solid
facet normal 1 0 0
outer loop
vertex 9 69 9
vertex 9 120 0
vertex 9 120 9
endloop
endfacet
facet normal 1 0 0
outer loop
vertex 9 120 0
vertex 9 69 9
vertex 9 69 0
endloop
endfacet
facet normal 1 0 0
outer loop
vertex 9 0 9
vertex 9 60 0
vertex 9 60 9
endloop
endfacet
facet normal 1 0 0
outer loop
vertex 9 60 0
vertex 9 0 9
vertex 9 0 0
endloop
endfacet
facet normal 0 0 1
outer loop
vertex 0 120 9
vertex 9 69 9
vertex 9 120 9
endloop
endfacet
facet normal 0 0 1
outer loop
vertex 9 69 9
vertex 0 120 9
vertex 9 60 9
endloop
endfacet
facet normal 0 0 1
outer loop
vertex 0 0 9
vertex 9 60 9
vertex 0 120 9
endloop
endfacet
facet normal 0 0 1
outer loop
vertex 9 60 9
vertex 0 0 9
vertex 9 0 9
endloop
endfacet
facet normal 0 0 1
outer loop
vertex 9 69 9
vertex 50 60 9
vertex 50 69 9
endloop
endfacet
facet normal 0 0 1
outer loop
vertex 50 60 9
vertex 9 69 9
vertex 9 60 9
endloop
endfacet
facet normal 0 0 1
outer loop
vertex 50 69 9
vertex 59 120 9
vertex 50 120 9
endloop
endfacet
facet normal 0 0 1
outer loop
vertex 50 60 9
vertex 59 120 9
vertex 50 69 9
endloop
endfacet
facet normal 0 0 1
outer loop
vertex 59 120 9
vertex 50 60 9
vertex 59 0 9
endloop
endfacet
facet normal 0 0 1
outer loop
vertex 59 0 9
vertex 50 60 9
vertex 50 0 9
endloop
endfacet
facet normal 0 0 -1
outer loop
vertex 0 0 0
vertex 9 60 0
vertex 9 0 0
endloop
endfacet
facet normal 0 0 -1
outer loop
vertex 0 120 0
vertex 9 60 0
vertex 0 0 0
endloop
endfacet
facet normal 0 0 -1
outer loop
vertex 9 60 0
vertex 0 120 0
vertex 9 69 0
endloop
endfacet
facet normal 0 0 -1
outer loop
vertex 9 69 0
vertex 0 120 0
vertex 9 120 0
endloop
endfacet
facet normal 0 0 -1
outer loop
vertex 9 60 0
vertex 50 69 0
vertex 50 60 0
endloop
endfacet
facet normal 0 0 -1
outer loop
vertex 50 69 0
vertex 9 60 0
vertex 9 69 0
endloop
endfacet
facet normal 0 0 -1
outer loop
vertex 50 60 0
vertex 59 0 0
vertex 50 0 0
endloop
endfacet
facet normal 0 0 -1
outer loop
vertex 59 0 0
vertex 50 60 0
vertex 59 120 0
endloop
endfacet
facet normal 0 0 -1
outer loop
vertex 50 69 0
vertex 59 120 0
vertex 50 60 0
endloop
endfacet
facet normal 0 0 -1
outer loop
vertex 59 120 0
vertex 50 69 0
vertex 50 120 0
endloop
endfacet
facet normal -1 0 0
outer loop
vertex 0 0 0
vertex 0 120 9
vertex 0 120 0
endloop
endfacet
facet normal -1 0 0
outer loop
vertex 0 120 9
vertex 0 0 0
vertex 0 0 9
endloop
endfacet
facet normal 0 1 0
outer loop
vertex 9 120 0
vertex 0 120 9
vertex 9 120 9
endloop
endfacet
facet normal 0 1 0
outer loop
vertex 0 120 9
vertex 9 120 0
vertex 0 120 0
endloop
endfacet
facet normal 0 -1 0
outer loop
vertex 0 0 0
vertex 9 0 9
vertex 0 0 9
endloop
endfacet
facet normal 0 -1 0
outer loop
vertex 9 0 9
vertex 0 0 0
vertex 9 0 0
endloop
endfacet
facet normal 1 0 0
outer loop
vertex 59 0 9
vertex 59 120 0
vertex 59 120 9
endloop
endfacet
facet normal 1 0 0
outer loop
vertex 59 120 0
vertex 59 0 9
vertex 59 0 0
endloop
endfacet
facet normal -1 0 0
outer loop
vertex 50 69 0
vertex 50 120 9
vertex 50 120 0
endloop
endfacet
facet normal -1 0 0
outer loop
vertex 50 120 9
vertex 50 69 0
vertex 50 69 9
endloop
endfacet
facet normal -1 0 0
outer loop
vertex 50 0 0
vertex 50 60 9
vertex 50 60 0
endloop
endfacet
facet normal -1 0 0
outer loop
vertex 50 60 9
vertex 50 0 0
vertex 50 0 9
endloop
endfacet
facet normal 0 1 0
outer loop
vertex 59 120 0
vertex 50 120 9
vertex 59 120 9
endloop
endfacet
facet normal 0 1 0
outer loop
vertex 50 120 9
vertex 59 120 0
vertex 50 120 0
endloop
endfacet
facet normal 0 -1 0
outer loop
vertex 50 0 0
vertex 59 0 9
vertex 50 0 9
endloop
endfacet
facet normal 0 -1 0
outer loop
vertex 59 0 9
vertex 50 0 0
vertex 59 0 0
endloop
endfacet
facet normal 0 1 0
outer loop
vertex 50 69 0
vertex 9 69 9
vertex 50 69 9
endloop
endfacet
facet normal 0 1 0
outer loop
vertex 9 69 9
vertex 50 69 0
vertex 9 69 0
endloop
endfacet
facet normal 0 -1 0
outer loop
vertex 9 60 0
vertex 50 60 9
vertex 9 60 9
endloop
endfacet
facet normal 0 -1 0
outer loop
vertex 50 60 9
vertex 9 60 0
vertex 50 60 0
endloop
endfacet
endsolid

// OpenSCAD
//буква h
module H(x=3, y=40, z=3 ){
 z2=y/2;
 union(){
 cube([x,y,z]);
 translate([x1,0,0]) cube([x,y,z]);
 translate([0,z2,0]) cube([x1,z,x]);
}
}
 H(x=9, y=120, z=9,  x1=50);
